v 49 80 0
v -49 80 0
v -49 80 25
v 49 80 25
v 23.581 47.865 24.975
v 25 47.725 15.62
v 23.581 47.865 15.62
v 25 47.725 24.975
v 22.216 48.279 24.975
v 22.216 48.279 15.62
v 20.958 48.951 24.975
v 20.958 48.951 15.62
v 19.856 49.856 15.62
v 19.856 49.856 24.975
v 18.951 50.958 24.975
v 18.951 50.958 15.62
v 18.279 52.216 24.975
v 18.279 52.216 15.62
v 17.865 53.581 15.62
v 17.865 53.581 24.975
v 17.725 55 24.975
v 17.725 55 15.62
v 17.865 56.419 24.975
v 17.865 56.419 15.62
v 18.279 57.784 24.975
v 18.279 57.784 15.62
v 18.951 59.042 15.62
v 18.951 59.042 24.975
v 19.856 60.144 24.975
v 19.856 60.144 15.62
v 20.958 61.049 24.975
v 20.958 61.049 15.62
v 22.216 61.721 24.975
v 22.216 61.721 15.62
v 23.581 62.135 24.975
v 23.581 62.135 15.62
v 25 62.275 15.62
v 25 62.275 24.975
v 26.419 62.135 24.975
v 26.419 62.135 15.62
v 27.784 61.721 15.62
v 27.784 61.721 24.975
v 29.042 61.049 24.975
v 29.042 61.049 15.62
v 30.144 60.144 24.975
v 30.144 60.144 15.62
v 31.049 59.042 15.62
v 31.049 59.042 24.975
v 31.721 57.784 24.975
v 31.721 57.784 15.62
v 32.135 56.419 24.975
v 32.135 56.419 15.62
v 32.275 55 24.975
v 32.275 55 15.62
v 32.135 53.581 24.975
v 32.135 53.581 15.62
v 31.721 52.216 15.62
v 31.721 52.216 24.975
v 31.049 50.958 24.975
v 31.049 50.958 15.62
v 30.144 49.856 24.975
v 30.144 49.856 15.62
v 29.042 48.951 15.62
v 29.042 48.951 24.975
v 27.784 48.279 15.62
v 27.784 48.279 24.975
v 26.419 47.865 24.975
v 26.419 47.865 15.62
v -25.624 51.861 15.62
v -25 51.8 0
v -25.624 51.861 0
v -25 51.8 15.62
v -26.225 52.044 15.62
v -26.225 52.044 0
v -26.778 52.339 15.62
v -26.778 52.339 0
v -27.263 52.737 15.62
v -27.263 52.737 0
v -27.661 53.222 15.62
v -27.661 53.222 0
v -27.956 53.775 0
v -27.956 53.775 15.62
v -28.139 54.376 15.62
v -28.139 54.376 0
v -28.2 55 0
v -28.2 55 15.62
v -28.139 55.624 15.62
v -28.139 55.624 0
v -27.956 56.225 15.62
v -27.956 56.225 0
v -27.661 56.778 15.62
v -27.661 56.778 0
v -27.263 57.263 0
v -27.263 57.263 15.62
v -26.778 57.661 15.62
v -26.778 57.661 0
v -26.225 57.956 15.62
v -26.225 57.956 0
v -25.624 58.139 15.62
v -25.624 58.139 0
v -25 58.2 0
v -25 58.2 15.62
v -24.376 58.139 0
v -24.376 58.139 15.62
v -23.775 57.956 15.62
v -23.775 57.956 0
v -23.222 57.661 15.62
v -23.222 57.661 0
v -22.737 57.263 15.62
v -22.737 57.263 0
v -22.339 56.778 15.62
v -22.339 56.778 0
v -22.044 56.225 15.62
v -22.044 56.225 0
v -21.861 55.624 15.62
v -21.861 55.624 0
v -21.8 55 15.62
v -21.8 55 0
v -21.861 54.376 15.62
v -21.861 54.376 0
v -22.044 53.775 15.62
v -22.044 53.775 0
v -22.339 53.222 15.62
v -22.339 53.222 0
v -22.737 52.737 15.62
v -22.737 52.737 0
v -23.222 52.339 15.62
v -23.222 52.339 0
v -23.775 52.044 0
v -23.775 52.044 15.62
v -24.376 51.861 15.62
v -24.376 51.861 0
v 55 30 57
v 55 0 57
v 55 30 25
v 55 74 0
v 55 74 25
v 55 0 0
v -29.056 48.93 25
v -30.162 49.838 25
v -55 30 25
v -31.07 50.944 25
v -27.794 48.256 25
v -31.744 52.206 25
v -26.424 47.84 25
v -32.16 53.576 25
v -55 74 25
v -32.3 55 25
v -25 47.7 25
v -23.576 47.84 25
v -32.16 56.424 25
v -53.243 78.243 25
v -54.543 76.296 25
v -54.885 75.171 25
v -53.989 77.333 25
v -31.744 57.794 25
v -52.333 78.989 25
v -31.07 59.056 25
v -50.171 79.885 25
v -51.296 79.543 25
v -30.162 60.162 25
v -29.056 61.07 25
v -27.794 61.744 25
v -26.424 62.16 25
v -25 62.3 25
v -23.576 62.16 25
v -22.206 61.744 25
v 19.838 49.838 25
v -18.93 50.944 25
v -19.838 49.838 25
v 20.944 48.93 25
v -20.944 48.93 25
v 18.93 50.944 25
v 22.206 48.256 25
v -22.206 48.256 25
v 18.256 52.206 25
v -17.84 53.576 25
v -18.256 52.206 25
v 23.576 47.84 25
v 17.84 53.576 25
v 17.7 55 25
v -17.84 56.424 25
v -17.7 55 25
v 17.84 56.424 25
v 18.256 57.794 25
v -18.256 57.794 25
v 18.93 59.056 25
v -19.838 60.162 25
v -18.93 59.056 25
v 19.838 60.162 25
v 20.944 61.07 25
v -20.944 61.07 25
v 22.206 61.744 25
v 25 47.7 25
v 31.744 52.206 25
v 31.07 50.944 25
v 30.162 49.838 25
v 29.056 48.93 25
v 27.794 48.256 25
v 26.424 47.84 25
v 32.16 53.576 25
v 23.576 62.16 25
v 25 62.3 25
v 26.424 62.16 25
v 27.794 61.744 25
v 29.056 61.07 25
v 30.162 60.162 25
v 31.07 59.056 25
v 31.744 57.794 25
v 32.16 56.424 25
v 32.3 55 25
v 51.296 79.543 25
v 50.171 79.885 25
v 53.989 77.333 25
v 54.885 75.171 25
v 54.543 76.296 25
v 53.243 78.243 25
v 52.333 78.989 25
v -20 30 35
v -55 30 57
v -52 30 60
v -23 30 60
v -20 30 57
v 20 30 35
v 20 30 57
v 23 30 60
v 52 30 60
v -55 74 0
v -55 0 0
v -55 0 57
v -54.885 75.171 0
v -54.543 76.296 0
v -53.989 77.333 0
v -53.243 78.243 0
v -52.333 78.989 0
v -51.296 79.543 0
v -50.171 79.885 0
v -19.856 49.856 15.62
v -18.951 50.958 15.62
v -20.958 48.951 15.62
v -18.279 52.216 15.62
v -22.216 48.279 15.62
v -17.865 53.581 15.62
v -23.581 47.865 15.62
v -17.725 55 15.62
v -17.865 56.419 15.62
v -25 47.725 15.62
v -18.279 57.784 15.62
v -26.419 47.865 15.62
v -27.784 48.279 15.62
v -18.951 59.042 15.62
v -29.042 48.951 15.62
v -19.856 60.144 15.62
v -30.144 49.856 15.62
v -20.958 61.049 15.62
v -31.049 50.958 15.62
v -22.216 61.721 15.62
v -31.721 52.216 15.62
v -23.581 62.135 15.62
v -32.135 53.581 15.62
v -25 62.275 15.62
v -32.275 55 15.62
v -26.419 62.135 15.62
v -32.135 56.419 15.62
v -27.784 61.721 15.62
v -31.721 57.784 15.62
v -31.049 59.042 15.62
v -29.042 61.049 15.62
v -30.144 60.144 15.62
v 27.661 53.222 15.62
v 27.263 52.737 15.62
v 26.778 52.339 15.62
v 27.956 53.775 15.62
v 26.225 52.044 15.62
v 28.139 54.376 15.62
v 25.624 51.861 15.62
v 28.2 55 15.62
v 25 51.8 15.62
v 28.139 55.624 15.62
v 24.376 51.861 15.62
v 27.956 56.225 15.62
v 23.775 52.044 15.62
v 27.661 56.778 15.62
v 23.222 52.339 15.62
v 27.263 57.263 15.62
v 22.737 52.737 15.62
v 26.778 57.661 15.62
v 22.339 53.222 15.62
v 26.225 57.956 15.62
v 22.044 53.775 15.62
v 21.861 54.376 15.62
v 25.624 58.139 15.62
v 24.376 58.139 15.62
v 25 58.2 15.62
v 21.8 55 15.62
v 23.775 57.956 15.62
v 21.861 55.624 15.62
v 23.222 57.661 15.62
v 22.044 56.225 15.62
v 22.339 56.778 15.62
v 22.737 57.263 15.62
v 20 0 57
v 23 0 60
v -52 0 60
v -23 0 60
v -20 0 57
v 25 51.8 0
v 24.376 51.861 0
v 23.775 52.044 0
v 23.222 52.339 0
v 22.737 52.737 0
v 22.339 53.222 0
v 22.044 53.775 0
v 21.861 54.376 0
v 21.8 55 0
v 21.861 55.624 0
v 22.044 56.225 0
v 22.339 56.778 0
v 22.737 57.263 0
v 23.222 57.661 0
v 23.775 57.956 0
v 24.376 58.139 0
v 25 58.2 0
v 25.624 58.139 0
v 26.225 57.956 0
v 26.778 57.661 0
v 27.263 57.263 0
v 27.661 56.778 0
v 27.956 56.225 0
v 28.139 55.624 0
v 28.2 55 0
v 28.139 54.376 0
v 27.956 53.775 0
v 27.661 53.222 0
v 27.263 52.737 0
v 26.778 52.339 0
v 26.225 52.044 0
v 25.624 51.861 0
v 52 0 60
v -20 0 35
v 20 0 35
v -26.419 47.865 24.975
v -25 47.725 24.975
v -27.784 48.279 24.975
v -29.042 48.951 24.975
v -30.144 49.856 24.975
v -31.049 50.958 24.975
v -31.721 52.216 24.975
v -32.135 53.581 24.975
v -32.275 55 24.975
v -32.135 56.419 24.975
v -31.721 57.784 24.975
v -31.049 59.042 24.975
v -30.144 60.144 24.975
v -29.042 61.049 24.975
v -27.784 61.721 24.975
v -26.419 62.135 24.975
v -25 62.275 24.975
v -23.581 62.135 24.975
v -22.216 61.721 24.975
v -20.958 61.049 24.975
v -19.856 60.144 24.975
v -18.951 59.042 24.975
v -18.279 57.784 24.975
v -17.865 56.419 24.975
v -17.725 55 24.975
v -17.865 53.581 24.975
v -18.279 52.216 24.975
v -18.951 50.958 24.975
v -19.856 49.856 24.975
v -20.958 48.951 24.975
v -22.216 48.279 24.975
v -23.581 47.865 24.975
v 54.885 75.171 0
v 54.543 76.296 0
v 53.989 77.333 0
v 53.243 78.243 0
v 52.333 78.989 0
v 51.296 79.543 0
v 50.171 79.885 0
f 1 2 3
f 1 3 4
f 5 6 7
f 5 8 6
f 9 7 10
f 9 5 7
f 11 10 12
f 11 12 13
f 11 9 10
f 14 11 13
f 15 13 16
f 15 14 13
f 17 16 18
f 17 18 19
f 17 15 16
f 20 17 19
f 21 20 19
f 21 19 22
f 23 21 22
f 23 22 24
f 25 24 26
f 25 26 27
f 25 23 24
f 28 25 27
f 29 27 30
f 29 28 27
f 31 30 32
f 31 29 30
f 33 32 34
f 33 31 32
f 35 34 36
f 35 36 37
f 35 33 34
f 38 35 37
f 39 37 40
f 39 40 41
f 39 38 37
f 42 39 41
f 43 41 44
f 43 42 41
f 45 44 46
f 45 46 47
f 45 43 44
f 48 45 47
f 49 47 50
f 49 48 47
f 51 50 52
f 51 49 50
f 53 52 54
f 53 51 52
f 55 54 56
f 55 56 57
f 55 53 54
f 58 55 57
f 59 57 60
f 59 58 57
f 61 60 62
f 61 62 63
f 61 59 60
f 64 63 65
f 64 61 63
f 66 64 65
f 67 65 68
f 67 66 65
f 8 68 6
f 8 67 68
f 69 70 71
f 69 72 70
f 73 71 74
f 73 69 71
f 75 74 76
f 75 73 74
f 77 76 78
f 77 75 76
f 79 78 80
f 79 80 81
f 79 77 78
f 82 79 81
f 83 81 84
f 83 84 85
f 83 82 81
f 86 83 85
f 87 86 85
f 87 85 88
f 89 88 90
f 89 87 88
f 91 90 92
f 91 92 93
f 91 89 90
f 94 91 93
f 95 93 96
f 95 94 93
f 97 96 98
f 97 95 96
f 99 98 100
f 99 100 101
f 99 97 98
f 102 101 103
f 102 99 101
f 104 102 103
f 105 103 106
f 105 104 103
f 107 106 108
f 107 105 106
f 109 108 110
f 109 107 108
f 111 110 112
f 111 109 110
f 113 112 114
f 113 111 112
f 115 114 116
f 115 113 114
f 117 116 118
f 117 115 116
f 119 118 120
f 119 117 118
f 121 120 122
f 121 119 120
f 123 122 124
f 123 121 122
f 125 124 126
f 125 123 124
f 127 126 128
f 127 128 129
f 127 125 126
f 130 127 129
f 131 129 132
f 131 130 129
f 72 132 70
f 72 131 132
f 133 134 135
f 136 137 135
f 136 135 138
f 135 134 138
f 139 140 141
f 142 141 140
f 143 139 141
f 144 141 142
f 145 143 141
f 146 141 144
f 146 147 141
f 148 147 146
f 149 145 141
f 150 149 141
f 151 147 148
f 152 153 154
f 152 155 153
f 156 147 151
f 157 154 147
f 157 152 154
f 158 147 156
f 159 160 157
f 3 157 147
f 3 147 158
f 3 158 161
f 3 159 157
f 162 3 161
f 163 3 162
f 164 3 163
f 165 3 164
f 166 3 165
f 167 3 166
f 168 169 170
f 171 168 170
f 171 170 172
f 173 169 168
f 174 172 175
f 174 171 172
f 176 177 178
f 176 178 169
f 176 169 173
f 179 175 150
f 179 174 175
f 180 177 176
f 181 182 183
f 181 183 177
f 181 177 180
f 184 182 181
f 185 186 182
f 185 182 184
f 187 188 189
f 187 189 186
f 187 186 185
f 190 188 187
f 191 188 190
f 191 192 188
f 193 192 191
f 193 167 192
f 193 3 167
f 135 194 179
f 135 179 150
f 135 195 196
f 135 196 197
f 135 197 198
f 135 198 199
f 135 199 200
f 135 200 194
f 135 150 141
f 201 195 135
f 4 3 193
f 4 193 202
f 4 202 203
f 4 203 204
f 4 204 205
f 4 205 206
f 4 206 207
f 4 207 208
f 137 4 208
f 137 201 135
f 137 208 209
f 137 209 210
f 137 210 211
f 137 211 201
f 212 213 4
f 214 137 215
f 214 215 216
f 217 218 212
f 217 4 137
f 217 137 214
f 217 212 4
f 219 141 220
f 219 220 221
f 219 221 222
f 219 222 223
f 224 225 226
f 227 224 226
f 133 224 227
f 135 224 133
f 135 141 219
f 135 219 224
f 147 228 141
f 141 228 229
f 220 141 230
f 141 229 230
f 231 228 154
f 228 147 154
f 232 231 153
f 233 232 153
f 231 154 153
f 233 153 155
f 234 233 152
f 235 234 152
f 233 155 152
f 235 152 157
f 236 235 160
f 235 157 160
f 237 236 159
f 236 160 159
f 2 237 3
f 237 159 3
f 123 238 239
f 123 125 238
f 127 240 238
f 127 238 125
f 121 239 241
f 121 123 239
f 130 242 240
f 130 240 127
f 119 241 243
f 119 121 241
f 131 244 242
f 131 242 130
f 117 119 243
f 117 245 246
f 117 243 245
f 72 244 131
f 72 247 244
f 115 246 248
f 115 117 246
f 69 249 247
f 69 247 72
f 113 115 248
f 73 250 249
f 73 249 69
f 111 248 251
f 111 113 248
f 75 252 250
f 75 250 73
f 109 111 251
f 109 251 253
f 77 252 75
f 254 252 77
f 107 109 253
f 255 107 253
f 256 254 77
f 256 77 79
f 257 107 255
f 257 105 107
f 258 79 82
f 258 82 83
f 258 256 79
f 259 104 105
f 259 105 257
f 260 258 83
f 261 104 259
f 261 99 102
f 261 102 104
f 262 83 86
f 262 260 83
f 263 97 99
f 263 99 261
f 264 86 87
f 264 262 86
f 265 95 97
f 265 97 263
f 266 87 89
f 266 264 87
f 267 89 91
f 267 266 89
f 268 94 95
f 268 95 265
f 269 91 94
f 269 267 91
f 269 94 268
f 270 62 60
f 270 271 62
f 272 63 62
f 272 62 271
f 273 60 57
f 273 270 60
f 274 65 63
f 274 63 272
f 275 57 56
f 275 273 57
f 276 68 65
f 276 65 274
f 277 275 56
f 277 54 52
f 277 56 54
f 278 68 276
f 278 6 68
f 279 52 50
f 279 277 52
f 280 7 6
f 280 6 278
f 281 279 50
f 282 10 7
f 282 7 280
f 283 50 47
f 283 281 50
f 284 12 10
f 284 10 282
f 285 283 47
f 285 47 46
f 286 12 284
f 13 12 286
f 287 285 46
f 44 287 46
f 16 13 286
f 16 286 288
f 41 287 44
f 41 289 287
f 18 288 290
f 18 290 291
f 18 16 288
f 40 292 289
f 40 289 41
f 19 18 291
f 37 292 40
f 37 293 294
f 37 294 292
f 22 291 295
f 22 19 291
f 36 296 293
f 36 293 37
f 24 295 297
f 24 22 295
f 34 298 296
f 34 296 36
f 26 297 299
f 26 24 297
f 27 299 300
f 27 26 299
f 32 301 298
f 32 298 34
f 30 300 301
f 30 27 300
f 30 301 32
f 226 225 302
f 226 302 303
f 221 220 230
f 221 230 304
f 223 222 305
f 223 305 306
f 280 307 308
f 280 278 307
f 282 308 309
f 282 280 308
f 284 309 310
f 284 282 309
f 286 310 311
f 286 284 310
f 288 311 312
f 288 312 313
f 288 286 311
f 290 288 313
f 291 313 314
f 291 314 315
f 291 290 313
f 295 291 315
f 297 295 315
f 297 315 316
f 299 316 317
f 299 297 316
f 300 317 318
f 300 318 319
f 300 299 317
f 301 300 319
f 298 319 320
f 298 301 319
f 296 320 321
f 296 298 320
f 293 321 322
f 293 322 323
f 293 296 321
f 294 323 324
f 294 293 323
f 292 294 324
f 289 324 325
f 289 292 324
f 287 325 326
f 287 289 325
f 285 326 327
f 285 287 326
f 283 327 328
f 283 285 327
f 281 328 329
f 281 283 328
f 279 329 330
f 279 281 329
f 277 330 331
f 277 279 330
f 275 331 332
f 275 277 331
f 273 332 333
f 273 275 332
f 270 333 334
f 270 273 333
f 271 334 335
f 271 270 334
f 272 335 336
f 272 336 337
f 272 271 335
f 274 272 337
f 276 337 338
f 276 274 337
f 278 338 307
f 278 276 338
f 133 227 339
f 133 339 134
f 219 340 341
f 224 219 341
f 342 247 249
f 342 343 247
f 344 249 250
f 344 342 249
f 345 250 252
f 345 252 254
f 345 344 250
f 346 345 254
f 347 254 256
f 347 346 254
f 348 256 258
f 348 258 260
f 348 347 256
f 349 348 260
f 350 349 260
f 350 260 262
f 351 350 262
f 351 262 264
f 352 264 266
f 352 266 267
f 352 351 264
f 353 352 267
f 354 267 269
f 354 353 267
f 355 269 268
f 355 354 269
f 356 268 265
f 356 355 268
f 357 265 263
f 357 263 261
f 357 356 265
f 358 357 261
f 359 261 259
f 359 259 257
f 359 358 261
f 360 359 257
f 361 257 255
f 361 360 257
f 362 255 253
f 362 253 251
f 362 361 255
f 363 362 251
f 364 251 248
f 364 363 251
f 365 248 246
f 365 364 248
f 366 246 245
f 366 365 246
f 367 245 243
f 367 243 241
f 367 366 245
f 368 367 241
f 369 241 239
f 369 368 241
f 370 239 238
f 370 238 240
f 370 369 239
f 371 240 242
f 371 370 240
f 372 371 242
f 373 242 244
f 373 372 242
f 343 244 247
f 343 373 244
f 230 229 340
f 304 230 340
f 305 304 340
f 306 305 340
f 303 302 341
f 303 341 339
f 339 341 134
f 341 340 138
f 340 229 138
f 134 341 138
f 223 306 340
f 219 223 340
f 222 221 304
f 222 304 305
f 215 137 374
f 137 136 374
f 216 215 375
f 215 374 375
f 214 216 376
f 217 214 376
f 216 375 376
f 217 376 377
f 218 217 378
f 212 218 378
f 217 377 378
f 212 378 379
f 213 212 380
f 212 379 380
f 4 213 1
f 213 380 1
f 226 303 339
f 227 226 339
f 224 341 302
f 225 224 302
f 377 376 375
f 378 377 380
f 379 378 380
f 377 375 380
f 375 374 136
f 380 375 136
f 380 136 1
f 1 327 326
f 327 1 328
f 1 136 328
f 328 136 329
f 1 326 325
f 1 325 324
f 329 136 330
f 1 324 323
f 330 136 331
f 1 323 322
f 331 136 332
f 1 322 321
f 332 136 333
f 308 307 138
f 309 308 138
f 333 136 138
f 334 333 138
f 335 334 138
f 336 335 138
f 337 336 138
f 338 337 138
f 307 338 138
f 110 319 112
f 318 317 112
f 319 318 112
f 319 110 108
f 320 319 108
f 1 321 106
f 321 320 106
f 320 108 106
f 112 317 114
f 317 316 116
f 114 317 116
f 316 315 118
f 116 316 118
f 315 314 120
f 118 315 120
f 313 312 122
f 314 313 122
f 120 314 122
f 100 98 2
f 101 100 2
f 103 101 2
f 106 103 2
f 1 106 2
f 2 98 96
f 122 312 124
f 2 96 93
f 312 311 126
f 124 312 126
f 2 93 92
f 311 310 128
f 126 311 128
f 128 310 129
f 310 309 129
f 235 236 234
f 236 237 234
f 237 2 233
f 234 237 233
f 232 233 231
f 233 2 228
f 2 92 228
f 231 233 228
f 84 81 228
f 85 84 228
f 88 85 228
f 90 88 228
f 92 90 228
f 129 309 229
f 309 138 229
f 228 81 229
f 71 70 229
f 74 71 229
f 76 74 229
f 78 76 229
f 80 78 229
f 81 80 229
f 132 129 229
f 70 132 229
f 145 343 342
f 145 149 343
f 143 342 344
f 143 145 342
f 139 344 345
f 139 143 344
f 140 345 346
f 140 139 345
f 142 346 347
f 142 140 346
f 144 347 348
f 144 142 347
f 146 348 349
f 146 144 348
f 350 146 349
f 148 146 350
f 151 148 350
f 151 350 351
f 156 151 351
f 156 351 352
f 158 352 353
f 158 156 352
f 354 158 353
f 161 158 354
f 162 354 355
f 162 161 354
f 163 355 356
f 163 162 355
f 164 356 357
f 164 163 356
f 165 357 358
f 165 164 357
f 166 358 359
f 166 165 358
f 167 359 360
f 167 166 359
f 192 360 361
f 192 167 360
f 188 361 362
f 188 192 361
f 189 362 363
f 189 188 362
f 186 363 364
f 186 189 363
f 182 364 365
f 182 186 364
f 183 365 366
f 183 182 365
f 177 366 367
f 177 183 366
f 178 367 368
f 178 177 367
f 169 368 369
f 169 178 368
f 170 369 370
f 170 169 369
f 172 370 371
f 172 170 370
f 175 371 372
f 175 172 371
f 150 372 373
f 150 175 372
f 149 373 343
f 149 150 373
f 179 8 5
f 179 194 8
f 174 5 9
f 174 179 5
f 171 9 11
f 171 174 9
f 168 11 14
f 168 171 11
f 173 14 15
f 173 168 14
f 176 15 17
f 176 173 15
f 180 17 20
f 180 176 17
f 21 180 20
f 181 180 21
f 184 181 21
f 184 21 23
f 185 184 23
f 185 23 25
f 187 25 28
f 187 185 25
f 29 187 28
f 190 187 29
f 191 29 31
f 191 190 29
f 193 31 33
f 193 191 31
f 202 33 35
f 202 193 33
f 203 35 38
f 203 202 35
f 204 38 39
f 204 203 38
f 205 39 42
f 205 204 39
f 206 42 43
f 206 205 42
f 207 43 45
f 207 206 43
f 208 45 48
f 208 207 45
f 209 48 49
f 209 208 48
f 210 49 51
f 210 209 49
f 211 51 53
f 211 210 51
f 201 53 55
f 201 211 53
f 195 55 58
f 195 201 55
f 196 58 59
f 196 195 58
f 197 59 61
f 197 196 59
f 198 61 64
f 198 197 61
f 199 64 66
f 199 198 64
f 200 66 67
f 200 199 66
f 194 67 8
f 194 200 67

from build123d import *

# Parameters (mm, degrees)
BOSS_EXTRUDE1_DEPTH                    = 80
SKETCH2_W                              = 127.893941609
SKETCH2_H                              = 47.2063817
CUT_EXTRUDE1_DEPTH                     = 50
FILLET1_R                              = 6
CBORE_FOR_M6_HEX_HEAD_BOLT1_AT_2_COUNT = 2
CBORE_FOR_M6_HEX_HEAD_BOLT1_AT_2_PITCH = 50


with BuildPart() as part:
    # Sketch1 → Boss-Extrude1 (new body)
    with BuildSketch(Plane(origin=(0, 0, 0), x_dir=(1, 0, 0), z_dir=(0, 1, 0))):
        Polygon((-20, -57), (-20, -35), (20, -35), (20, -57), (23, -60), (52, -60), (55, -57), (55, 0), (-55, 0), (-55, -57), (-52, -60), (-23, -60), align=None)
    extrude(amount=BOSS_EXTRUDE1_DEPTH)

    # Sketch2 → Cut-Extrude1 (cut)
    with BuildSketch(Plane(origin=(0, 80, 0), x_dir=(1, 0, 0), z_dir=(0, 1, 0))):
        with Locations((-0.415915258, -48.60319085)):
            Rectangle(SKETCH2_W, SKETCH2_H)
    extrude(amount=-CUT_EXTRUDE1_DEPTH, mode=Mode.SUBTRACT)

    # Fillet1
    fillet1_edges = [part.edges().sort_by_distance(p)[0] for p in [
        (55, 80, 12.5),
        (-55, 80, 12.5),
    ]]
    fillet(fillet1_edges, radius=FILLET1_R)

    # Sketch3 → CBORE for M6 Hex Head Bolt1 (revolve, cut)
    with BuildSketch(Plane(origin=(-25, 55, 25), x_dir=(0, -1, 0), z_dir=(1, 0, 0))):
        Polygon((0, 0), (0, 25), (3.2, 25), (3.2, 9.38), (7.275, 9.38), (7.275, 0.025), (7.3, 0), align=None)
    cbore_for_m6_hex_head_bolt1 = revolve(axis=Axis((-25, 55, 31.35), (0, 0, -1)), mode=Mode.SUBTRACT)

    # CBORE for M6 Hex Head Bolt1 at 2: CBORE for M6 Hex Head Bolt1 ×2
    with Locations(*[(i * CBORE_FOR_M6_HEX_HEAD_BOLT1_AT_2_PITCH, 0, 0) for i in range(1, CBORE_FOR_M6_HEX_HEAD_BOLT1_AT_2_COUNT)]):
        add(cbore_for_m6_hex_head_bolt1, mode=Mode.SUBTRACT)


solid = part.part
